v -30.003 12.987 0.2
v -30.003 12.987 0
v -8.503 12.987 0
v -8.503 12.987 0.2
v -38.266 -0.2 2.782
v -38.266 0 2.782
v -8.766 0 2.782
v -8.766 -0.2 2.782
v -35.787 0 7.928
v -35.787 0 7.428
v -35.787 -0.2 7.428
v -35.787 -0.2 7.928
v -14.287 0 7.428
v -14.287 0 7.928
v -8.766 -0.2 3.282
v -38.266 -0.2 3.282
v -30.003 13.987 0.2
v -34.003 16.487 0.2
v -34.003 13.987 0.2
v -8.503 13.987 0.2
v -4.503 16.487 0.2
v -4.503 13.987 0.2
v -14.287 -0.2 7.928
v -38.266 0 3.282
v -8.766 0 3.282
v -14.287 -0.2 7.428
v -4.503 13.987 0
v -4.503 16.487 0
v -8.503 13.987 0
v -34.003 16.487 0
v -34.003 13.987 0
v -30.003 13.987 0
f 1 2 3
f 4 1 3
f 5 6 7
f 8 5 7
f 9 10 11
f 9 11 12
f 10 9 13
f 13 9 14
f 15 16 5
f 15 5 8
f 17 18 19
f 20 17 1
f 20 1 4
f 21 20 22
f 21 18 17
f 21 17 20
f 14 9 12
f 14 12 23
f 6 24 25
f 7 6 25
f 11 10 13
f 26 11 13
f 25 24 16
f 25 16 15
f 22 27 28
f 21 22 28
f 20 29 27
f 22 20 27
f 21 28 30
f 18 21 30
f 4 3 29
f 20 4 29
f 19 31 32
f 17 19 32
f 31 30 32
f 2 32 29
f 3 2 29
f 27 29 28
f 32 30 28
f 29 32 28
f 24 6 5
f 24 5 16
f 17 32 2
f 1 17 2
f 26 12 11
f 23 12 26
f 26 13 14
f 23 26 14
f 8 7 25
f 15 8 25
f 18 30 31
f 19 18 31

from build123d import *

# Parameters (mm, degrees)
F1_DEPTH = 0.2
F2_W     = 21.5
F2_H     = 0.5
F3_DEPTH = 0.2
F4_W     = 29.5
F4_H     = 0.5
F5_DEPTH = 0.2


with BuildPart() as f1:
    # F0 (on Top) → F1 (new body)
    with BuildSketch(Plane.XY):
        Polygon((-4.502881, 16.486939), (-34.002881, 16.486939), (-34.002881, 13.986939), (-30.002881, 13.986939), (-30.002881, 12.986939), (-8.502881, 12.986939), (-8.502881, 13.986939), (-4.502881, 13.986939), align=None)
    extrude(amount=F1_DEPTH)


with BuildPart() as f3:
    # F2 (on Front) → F3 (new body)
    with BuildSketch(Plane.XZ):
        with Locations((-25.037248, 7.677589)):
            Rectangle(F2_W, F2_H)
    extrude(amount=F3_DEPTH)


with BuildPart() as f5:
    # F4 (on Front) → F5 (new body)
    with BuildSketch(Plane.XZ):
        with Locations((-23.516471, 3.032457)):
            Rectangle(F4_W, F4_H)
    extrude(amount=F5_DEPTH)


solid = Compound([f1.part, f3.part, f5.part])
